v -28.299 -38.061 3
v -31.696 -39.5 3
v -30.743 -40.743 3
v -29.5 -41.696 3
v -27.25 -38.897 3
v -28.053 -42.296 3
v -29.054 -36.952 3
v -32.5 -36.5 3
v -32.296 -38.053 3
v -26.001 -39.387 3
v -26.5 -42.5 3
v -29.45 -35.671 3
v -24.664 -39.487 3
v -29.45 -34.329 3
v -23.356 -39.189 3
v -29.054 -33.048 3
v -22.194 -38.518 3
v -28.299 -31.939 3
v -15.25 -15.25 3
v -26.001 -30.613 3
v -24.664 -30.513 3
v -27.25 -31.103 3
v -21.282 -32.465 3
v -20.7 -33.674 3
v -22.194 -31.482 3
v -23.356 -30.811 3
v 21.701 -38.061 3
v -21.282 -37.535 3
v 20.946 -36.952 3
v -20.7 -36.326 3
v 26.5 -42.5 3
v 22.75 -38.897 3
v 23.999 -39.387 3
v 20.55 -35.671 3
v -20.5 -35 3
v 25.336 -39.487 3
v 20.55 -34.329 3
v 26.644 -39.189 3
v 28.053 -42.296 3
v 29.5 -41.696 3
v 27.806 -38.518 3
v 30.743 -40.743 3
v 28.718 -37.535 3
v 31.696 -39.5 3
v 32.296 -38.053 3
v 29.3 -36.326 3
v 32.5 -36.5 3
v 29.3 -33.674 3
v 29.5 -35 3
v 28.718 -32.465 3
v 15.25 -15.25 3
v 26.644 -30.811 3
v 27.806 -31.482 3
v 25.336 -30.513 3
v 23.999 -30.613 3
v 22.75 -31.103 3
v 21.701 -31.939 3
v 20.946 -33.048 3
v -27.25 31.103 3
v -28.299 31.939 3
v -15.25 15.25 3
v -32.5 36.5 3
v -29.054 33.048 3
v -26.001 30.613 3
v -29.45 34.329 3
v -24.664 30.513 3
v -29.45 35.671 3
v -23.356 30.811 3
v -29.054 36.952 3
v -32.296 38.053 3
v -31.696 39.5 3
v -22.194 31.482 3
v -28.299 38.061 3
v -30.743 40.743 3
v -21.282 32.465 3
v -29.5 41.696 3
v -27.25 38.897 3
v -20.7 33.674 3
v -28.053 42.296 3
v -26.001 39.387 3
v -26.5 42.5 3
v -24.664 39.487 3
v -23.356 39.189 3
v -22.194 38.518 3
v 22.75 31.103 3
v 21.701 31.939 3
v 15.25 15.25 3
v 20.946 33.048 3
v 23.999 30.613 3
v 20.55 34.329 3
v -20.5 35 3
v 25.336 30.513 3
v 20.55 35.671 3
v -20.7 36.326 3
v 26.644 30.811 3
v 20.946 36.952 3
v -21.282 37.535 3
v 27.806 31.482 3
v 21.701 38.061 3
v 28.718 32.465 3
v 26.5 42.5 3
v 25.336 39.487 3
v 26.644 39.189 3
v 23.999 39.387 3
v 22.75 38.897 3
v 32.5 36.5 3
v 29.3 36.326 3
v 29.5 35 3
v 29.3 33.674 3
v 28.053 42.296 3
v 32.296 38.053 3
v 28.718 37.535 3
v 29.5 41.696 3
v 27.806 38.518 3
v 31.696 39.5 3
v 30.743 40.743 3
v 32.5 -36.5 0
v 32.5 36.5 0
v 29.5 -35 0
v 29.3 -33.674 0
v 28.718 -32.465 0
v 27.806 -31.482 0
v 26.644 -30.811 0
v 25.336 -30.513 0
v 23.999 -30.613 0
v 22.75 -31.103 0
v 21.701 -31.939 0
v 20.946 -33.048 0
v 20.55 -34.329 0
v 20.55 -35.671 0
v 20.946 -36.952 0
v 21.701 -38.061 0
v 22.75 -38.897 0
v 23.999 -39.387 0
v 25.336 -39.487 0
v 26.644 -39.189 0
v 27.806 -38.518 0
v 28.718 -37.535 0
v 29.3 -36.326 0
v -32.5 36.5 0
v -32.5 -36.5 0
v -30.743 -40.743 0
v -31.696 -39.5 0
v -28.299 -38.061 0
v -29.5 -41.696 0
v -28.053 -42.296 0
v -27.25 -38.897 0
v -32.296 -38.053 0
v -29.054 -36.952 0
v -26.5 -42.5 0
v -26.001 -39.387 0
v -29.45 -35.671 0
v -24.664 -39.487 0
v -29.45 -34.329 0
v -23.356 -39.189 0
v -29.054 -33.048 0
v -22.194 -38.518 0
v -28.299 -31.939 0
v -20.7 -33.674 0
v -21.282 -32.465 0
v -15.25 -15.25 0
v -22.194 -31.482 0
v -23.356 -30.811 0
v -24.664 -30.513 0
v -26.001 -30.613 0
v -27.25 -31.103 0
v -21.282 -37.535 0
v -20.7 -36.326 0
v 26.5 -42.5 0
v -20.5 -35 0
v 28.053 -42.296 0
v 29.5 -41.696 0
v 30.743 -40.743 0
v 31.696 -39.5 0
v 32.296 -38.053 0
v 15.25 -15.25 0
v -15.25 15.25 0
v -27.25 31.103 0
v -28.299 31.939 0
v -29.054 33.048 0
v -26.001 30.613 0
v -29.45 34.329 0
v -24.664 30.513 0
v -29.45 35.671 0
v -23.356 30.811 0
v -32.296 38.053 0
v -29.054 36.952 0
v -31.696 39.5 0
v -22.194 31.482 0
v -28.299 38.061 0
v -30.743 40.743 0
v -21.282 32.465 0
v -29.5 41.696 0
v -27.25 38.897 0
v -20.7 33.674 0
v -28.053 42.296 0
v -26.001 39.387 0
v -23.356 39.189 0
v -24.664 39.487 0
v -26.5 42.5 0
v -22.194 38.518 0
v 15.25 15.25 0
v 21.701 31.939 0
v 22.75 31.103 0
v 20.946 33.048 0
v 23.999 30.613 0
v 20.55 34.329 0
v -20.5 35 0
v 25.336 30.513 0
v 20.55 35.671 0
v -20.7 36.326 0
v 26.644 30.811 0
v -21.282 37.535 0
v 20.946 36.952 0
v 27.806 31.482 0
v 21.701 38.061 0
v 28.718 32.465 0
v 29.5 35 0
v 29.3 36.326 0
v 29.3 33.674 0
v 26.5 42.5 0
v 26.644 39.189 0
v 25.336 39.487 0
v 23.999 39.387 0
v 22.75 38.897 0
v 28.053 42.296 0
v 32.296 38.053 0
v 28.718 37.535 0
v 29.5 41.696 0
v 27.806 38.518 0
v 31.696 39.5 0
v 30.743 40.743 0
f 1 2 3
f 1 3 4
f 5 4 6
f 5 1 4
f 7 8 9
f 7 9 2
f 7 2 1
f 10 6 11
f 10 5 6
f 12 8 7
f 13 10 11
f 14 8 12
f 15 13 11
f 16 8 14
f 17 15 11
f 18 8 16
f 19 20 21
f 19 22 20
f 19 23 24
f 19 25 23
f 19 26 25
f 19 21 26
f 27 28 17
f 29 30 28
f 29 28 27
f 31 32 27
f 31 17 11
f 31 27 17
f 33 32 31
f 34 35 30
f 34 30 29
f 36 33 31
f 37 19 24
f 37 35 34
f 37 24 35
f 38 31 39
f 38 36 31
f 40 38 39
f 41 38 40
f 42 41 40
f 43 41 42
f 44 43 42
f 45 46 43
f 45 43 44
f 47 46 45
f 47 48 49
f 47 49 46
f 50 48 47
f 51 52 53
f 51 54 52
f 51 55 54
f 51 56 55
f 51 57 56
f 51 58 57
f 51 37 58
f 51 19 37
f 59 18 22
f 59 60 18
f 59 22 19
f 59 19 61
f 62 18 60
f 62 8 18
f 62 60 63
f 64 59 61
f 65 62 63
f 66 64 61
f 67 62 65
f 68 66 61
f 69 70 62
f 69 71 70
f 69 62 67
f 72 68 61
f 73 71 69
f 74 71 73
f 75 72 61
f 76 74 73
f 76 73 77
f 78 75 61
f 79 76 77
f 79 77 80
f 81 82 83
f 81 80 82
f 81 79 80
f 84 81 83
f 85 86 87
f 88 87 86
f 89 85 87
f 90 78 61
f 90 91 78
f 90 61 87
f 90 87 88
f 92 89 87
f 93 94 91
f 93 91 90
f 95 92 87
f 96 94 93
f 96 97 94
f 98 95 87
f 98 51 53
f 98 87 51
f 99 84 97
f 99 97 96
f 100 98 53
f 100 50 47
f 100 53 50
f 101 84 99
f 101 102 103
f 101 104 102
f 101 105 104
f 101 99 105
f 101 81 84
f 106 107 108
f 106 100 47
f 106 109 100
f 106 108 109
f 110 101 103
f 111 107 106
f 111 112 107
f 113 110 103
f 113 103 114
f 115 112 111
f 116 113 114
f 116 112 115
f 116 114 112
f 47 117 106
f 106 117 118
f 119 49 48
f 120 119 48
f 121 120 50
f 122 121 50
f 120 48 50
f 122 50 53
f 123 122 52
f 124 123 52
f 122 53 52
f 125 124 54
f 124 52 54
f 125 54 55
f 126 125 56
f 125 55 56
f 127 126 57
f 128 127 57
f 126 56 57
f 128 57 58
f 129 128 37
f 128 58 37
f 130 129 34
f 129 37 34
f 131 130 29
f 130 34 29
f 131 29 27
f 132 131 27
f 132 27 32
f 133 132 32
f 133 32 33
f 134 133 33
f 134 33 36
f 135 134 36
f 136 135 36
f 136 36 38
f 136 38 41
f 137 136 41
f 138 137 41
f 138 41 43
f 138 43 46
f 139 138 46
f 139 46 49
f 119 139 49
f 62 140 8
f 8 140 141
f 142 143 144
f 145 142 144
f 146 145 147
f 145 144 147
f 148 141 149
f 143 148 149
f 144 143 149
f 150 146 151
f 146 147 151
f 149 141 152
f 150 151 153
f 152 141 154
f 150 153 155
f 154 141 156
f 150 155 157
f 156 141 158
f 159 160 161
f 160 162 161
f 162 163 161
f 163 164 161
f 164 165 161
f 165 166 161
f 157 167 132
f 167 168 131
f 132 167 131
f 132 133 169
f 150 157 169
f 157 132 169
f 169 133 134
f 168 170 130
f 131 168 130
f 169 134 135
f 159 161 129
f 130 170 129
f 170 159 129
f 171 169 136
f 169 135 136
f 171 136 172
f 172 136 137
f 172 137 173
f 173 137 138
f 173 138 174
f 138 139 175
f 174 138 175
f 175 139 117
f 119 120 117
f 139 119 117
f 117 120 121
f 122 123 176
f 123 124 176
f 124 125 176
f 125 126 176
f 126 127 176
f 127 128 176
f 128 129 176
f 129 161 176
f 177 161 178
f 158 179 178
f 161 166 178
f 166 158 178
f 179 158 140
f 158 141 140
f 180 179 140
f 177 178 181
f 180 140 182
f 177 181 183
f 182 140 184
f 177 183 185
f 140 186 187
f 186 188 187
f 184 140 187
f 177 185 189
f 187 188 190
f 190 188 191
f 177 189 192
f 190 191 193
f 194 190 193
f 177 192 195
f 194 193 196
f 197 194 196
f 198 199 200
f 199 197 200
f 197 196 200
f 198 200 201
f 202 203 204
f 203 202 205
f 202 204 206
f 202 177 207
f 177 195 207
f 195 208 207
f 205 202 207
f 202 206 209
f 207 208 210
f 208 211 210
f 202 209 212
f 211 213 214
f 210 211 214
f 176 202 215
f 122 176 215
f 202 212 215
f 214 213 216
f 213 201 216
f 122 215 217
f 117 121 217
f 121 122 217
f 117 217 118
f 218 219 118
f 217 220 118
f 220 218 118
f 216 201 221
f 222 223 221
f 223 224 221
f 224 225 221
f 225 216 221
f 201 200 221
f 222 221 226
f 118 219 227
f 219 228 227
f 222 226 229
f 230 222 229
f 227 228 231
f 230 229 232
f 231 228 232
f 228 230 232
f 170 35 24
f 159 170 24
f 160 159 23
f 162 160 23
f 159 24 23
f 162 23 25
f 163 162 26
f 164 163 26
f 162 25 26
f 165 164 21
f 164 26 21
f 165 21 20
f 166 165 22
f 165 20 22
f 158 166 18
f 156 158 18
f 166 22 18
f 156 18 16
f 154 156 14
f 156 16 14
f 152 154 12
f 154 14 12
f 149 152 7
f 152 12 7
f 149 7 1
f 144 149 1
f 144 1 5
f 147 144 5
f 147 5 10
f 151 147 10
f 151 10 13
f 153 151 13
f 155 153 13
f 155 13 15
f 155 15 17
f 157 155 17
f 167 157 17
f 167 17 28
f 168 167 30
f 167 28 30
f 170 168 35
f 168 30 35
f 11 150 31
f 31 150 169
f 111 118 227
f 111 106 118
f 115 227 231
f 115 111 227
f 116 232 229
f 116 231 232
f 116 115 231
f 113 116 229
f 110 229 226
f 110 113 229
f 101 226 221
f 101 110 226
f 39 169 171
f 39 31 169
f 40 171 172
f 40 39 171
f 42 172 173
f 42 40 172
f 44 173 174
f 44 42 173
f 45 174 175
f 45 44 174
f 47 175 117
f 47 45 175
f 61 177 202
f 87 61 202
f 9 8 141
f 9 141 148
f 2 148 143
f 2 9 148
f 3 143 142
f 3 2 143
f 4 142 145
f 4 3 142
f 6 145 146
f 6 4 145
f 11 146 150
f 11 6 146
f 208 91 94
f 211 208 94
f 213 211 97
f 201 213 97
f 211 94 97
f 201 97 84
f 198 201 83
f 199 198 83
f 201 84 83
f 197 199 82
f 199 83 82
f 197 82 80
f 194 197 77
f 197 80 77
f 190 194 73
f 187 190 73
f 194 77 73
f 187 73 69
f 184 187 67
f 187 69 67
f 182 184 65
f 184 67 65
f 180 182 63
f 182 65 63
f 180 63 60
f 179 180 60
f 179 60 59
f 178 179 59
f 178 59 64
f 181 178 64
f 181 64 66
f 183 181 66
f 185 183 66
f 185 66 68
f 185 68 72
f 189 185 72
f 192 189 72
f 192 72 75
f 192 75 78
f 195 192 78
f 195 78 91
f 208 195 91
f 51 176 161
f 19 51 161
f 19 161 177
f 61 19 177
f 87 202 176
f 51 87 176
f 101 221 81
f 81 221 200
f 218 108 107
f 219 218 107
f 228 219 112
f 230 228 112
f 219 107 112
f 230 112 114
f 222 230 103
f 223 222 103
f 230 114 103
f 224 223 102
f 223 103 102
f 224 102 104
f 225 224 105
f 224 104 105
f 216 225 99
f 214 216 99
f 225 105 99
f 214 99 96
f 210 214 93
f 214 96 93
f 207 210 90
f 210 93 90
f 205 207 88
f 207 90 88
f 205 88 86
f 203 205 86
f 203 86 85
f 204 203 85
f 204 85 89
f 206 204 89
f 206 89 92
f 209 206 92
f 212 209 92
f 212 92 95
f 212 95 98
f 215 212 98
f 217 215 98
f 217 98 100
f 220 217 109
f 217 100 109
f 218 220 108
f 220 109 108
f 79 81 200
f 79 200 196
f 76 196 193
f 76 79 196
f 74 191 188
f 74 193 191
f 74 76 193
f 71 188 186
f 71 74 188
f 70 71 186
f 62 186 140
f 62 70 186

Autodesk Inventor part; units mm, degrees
ref_plane "YZ Plane" through (0, 0, 0) normal (1, 0, 0) x (0, 1, 0)
ref_plane "XZ Plane" through (0, 0, 0) normal (0, 1, 0) x (-1, 0, 0)
ref_plane "XY Plane" through (0, 0, 0) normal (0, 0, 1) x (1, 0, 0)
sketch "Sketch1" plane through (0, 0, 0) normal (0, 0, 1) x (1, 0, 0)
  line L0 (-32.5, -42.5) -> (32.5, -42.5)
  line L1 (32.5, -42.5) -> (32.5, 42.5)
  line L2 (32.5, 42.5) -> (-32.5, 42.5)
  line L3 (-32.5, 42.5) -> (-32.5, -42.5)
  line L4 (-32.5, -42.5) -> (32.5, 42.5) construction
  line L5 (32.5, -42.5) -> (-32.5, 42.5) construction
  line L6 (15.25, -15.25) -> (-15.25, -15.25)
  line L7 (-15.25, -15.25) -> (-15.25, 15.25)
  line L8 (-15.25, 15.25) -> (15.25, 15.25)
  line L9 (15.25, 15.25) -> (15.25, -15.25)
  line L10 (15.25, -15.25) -> (-15.25, 15.25) construction
  line L11 (-15.25, -15.25) -> (15.25, 15.25) construction
  point P0 (0, 0)
  dimension "d154" = 65
  dimension "d155" = 85
  dimension "d172" = 30.5
extrude "Plate5" add sketch "Sketch1" along normal blind 3
sketch "Sketch9" plane through (0, 0, 3) normal (0, 0, 1) x (1, 0, 0)
  circle A0 centre (25, -35) radius 4.5
  line L0 (25, 35) -> (-25, 35) construction
  line L1 (-25, 35) -> (-25, -35) construction
  line L2 (-25, -35) -> (25, -35) construction
  line L3 (25, -35) -> (25, 35) construction
  line L4 (25, 35) -> (-25, -35) construction
  line L5 (-25, 35) -> (25, -35) construction
  circle A1 centre (-25, -35) radius 4.5
  circle A2 centre (25, 35) radius 4.5
  circle A3 centre (-25, 35) radius 4.5
  point P0 (0, 0)
  dimension "d173" = 70
  dimension "d174" = 9
  dimension "d175" = 50
extrude "Cut2" cut sketch "Sketch9" against normal blind 3
fillet "Corner Round1" radius 6 4 edges at (32.5, 42.5, 1.5) (-32.5, 42.5, 1.5) (-32.5, -42.5, 1.5) (32.5, -42.5, 1.5)
properties part number "PNS 760 FDS 1200 FLANGE 3" material "Stainless Steel"
